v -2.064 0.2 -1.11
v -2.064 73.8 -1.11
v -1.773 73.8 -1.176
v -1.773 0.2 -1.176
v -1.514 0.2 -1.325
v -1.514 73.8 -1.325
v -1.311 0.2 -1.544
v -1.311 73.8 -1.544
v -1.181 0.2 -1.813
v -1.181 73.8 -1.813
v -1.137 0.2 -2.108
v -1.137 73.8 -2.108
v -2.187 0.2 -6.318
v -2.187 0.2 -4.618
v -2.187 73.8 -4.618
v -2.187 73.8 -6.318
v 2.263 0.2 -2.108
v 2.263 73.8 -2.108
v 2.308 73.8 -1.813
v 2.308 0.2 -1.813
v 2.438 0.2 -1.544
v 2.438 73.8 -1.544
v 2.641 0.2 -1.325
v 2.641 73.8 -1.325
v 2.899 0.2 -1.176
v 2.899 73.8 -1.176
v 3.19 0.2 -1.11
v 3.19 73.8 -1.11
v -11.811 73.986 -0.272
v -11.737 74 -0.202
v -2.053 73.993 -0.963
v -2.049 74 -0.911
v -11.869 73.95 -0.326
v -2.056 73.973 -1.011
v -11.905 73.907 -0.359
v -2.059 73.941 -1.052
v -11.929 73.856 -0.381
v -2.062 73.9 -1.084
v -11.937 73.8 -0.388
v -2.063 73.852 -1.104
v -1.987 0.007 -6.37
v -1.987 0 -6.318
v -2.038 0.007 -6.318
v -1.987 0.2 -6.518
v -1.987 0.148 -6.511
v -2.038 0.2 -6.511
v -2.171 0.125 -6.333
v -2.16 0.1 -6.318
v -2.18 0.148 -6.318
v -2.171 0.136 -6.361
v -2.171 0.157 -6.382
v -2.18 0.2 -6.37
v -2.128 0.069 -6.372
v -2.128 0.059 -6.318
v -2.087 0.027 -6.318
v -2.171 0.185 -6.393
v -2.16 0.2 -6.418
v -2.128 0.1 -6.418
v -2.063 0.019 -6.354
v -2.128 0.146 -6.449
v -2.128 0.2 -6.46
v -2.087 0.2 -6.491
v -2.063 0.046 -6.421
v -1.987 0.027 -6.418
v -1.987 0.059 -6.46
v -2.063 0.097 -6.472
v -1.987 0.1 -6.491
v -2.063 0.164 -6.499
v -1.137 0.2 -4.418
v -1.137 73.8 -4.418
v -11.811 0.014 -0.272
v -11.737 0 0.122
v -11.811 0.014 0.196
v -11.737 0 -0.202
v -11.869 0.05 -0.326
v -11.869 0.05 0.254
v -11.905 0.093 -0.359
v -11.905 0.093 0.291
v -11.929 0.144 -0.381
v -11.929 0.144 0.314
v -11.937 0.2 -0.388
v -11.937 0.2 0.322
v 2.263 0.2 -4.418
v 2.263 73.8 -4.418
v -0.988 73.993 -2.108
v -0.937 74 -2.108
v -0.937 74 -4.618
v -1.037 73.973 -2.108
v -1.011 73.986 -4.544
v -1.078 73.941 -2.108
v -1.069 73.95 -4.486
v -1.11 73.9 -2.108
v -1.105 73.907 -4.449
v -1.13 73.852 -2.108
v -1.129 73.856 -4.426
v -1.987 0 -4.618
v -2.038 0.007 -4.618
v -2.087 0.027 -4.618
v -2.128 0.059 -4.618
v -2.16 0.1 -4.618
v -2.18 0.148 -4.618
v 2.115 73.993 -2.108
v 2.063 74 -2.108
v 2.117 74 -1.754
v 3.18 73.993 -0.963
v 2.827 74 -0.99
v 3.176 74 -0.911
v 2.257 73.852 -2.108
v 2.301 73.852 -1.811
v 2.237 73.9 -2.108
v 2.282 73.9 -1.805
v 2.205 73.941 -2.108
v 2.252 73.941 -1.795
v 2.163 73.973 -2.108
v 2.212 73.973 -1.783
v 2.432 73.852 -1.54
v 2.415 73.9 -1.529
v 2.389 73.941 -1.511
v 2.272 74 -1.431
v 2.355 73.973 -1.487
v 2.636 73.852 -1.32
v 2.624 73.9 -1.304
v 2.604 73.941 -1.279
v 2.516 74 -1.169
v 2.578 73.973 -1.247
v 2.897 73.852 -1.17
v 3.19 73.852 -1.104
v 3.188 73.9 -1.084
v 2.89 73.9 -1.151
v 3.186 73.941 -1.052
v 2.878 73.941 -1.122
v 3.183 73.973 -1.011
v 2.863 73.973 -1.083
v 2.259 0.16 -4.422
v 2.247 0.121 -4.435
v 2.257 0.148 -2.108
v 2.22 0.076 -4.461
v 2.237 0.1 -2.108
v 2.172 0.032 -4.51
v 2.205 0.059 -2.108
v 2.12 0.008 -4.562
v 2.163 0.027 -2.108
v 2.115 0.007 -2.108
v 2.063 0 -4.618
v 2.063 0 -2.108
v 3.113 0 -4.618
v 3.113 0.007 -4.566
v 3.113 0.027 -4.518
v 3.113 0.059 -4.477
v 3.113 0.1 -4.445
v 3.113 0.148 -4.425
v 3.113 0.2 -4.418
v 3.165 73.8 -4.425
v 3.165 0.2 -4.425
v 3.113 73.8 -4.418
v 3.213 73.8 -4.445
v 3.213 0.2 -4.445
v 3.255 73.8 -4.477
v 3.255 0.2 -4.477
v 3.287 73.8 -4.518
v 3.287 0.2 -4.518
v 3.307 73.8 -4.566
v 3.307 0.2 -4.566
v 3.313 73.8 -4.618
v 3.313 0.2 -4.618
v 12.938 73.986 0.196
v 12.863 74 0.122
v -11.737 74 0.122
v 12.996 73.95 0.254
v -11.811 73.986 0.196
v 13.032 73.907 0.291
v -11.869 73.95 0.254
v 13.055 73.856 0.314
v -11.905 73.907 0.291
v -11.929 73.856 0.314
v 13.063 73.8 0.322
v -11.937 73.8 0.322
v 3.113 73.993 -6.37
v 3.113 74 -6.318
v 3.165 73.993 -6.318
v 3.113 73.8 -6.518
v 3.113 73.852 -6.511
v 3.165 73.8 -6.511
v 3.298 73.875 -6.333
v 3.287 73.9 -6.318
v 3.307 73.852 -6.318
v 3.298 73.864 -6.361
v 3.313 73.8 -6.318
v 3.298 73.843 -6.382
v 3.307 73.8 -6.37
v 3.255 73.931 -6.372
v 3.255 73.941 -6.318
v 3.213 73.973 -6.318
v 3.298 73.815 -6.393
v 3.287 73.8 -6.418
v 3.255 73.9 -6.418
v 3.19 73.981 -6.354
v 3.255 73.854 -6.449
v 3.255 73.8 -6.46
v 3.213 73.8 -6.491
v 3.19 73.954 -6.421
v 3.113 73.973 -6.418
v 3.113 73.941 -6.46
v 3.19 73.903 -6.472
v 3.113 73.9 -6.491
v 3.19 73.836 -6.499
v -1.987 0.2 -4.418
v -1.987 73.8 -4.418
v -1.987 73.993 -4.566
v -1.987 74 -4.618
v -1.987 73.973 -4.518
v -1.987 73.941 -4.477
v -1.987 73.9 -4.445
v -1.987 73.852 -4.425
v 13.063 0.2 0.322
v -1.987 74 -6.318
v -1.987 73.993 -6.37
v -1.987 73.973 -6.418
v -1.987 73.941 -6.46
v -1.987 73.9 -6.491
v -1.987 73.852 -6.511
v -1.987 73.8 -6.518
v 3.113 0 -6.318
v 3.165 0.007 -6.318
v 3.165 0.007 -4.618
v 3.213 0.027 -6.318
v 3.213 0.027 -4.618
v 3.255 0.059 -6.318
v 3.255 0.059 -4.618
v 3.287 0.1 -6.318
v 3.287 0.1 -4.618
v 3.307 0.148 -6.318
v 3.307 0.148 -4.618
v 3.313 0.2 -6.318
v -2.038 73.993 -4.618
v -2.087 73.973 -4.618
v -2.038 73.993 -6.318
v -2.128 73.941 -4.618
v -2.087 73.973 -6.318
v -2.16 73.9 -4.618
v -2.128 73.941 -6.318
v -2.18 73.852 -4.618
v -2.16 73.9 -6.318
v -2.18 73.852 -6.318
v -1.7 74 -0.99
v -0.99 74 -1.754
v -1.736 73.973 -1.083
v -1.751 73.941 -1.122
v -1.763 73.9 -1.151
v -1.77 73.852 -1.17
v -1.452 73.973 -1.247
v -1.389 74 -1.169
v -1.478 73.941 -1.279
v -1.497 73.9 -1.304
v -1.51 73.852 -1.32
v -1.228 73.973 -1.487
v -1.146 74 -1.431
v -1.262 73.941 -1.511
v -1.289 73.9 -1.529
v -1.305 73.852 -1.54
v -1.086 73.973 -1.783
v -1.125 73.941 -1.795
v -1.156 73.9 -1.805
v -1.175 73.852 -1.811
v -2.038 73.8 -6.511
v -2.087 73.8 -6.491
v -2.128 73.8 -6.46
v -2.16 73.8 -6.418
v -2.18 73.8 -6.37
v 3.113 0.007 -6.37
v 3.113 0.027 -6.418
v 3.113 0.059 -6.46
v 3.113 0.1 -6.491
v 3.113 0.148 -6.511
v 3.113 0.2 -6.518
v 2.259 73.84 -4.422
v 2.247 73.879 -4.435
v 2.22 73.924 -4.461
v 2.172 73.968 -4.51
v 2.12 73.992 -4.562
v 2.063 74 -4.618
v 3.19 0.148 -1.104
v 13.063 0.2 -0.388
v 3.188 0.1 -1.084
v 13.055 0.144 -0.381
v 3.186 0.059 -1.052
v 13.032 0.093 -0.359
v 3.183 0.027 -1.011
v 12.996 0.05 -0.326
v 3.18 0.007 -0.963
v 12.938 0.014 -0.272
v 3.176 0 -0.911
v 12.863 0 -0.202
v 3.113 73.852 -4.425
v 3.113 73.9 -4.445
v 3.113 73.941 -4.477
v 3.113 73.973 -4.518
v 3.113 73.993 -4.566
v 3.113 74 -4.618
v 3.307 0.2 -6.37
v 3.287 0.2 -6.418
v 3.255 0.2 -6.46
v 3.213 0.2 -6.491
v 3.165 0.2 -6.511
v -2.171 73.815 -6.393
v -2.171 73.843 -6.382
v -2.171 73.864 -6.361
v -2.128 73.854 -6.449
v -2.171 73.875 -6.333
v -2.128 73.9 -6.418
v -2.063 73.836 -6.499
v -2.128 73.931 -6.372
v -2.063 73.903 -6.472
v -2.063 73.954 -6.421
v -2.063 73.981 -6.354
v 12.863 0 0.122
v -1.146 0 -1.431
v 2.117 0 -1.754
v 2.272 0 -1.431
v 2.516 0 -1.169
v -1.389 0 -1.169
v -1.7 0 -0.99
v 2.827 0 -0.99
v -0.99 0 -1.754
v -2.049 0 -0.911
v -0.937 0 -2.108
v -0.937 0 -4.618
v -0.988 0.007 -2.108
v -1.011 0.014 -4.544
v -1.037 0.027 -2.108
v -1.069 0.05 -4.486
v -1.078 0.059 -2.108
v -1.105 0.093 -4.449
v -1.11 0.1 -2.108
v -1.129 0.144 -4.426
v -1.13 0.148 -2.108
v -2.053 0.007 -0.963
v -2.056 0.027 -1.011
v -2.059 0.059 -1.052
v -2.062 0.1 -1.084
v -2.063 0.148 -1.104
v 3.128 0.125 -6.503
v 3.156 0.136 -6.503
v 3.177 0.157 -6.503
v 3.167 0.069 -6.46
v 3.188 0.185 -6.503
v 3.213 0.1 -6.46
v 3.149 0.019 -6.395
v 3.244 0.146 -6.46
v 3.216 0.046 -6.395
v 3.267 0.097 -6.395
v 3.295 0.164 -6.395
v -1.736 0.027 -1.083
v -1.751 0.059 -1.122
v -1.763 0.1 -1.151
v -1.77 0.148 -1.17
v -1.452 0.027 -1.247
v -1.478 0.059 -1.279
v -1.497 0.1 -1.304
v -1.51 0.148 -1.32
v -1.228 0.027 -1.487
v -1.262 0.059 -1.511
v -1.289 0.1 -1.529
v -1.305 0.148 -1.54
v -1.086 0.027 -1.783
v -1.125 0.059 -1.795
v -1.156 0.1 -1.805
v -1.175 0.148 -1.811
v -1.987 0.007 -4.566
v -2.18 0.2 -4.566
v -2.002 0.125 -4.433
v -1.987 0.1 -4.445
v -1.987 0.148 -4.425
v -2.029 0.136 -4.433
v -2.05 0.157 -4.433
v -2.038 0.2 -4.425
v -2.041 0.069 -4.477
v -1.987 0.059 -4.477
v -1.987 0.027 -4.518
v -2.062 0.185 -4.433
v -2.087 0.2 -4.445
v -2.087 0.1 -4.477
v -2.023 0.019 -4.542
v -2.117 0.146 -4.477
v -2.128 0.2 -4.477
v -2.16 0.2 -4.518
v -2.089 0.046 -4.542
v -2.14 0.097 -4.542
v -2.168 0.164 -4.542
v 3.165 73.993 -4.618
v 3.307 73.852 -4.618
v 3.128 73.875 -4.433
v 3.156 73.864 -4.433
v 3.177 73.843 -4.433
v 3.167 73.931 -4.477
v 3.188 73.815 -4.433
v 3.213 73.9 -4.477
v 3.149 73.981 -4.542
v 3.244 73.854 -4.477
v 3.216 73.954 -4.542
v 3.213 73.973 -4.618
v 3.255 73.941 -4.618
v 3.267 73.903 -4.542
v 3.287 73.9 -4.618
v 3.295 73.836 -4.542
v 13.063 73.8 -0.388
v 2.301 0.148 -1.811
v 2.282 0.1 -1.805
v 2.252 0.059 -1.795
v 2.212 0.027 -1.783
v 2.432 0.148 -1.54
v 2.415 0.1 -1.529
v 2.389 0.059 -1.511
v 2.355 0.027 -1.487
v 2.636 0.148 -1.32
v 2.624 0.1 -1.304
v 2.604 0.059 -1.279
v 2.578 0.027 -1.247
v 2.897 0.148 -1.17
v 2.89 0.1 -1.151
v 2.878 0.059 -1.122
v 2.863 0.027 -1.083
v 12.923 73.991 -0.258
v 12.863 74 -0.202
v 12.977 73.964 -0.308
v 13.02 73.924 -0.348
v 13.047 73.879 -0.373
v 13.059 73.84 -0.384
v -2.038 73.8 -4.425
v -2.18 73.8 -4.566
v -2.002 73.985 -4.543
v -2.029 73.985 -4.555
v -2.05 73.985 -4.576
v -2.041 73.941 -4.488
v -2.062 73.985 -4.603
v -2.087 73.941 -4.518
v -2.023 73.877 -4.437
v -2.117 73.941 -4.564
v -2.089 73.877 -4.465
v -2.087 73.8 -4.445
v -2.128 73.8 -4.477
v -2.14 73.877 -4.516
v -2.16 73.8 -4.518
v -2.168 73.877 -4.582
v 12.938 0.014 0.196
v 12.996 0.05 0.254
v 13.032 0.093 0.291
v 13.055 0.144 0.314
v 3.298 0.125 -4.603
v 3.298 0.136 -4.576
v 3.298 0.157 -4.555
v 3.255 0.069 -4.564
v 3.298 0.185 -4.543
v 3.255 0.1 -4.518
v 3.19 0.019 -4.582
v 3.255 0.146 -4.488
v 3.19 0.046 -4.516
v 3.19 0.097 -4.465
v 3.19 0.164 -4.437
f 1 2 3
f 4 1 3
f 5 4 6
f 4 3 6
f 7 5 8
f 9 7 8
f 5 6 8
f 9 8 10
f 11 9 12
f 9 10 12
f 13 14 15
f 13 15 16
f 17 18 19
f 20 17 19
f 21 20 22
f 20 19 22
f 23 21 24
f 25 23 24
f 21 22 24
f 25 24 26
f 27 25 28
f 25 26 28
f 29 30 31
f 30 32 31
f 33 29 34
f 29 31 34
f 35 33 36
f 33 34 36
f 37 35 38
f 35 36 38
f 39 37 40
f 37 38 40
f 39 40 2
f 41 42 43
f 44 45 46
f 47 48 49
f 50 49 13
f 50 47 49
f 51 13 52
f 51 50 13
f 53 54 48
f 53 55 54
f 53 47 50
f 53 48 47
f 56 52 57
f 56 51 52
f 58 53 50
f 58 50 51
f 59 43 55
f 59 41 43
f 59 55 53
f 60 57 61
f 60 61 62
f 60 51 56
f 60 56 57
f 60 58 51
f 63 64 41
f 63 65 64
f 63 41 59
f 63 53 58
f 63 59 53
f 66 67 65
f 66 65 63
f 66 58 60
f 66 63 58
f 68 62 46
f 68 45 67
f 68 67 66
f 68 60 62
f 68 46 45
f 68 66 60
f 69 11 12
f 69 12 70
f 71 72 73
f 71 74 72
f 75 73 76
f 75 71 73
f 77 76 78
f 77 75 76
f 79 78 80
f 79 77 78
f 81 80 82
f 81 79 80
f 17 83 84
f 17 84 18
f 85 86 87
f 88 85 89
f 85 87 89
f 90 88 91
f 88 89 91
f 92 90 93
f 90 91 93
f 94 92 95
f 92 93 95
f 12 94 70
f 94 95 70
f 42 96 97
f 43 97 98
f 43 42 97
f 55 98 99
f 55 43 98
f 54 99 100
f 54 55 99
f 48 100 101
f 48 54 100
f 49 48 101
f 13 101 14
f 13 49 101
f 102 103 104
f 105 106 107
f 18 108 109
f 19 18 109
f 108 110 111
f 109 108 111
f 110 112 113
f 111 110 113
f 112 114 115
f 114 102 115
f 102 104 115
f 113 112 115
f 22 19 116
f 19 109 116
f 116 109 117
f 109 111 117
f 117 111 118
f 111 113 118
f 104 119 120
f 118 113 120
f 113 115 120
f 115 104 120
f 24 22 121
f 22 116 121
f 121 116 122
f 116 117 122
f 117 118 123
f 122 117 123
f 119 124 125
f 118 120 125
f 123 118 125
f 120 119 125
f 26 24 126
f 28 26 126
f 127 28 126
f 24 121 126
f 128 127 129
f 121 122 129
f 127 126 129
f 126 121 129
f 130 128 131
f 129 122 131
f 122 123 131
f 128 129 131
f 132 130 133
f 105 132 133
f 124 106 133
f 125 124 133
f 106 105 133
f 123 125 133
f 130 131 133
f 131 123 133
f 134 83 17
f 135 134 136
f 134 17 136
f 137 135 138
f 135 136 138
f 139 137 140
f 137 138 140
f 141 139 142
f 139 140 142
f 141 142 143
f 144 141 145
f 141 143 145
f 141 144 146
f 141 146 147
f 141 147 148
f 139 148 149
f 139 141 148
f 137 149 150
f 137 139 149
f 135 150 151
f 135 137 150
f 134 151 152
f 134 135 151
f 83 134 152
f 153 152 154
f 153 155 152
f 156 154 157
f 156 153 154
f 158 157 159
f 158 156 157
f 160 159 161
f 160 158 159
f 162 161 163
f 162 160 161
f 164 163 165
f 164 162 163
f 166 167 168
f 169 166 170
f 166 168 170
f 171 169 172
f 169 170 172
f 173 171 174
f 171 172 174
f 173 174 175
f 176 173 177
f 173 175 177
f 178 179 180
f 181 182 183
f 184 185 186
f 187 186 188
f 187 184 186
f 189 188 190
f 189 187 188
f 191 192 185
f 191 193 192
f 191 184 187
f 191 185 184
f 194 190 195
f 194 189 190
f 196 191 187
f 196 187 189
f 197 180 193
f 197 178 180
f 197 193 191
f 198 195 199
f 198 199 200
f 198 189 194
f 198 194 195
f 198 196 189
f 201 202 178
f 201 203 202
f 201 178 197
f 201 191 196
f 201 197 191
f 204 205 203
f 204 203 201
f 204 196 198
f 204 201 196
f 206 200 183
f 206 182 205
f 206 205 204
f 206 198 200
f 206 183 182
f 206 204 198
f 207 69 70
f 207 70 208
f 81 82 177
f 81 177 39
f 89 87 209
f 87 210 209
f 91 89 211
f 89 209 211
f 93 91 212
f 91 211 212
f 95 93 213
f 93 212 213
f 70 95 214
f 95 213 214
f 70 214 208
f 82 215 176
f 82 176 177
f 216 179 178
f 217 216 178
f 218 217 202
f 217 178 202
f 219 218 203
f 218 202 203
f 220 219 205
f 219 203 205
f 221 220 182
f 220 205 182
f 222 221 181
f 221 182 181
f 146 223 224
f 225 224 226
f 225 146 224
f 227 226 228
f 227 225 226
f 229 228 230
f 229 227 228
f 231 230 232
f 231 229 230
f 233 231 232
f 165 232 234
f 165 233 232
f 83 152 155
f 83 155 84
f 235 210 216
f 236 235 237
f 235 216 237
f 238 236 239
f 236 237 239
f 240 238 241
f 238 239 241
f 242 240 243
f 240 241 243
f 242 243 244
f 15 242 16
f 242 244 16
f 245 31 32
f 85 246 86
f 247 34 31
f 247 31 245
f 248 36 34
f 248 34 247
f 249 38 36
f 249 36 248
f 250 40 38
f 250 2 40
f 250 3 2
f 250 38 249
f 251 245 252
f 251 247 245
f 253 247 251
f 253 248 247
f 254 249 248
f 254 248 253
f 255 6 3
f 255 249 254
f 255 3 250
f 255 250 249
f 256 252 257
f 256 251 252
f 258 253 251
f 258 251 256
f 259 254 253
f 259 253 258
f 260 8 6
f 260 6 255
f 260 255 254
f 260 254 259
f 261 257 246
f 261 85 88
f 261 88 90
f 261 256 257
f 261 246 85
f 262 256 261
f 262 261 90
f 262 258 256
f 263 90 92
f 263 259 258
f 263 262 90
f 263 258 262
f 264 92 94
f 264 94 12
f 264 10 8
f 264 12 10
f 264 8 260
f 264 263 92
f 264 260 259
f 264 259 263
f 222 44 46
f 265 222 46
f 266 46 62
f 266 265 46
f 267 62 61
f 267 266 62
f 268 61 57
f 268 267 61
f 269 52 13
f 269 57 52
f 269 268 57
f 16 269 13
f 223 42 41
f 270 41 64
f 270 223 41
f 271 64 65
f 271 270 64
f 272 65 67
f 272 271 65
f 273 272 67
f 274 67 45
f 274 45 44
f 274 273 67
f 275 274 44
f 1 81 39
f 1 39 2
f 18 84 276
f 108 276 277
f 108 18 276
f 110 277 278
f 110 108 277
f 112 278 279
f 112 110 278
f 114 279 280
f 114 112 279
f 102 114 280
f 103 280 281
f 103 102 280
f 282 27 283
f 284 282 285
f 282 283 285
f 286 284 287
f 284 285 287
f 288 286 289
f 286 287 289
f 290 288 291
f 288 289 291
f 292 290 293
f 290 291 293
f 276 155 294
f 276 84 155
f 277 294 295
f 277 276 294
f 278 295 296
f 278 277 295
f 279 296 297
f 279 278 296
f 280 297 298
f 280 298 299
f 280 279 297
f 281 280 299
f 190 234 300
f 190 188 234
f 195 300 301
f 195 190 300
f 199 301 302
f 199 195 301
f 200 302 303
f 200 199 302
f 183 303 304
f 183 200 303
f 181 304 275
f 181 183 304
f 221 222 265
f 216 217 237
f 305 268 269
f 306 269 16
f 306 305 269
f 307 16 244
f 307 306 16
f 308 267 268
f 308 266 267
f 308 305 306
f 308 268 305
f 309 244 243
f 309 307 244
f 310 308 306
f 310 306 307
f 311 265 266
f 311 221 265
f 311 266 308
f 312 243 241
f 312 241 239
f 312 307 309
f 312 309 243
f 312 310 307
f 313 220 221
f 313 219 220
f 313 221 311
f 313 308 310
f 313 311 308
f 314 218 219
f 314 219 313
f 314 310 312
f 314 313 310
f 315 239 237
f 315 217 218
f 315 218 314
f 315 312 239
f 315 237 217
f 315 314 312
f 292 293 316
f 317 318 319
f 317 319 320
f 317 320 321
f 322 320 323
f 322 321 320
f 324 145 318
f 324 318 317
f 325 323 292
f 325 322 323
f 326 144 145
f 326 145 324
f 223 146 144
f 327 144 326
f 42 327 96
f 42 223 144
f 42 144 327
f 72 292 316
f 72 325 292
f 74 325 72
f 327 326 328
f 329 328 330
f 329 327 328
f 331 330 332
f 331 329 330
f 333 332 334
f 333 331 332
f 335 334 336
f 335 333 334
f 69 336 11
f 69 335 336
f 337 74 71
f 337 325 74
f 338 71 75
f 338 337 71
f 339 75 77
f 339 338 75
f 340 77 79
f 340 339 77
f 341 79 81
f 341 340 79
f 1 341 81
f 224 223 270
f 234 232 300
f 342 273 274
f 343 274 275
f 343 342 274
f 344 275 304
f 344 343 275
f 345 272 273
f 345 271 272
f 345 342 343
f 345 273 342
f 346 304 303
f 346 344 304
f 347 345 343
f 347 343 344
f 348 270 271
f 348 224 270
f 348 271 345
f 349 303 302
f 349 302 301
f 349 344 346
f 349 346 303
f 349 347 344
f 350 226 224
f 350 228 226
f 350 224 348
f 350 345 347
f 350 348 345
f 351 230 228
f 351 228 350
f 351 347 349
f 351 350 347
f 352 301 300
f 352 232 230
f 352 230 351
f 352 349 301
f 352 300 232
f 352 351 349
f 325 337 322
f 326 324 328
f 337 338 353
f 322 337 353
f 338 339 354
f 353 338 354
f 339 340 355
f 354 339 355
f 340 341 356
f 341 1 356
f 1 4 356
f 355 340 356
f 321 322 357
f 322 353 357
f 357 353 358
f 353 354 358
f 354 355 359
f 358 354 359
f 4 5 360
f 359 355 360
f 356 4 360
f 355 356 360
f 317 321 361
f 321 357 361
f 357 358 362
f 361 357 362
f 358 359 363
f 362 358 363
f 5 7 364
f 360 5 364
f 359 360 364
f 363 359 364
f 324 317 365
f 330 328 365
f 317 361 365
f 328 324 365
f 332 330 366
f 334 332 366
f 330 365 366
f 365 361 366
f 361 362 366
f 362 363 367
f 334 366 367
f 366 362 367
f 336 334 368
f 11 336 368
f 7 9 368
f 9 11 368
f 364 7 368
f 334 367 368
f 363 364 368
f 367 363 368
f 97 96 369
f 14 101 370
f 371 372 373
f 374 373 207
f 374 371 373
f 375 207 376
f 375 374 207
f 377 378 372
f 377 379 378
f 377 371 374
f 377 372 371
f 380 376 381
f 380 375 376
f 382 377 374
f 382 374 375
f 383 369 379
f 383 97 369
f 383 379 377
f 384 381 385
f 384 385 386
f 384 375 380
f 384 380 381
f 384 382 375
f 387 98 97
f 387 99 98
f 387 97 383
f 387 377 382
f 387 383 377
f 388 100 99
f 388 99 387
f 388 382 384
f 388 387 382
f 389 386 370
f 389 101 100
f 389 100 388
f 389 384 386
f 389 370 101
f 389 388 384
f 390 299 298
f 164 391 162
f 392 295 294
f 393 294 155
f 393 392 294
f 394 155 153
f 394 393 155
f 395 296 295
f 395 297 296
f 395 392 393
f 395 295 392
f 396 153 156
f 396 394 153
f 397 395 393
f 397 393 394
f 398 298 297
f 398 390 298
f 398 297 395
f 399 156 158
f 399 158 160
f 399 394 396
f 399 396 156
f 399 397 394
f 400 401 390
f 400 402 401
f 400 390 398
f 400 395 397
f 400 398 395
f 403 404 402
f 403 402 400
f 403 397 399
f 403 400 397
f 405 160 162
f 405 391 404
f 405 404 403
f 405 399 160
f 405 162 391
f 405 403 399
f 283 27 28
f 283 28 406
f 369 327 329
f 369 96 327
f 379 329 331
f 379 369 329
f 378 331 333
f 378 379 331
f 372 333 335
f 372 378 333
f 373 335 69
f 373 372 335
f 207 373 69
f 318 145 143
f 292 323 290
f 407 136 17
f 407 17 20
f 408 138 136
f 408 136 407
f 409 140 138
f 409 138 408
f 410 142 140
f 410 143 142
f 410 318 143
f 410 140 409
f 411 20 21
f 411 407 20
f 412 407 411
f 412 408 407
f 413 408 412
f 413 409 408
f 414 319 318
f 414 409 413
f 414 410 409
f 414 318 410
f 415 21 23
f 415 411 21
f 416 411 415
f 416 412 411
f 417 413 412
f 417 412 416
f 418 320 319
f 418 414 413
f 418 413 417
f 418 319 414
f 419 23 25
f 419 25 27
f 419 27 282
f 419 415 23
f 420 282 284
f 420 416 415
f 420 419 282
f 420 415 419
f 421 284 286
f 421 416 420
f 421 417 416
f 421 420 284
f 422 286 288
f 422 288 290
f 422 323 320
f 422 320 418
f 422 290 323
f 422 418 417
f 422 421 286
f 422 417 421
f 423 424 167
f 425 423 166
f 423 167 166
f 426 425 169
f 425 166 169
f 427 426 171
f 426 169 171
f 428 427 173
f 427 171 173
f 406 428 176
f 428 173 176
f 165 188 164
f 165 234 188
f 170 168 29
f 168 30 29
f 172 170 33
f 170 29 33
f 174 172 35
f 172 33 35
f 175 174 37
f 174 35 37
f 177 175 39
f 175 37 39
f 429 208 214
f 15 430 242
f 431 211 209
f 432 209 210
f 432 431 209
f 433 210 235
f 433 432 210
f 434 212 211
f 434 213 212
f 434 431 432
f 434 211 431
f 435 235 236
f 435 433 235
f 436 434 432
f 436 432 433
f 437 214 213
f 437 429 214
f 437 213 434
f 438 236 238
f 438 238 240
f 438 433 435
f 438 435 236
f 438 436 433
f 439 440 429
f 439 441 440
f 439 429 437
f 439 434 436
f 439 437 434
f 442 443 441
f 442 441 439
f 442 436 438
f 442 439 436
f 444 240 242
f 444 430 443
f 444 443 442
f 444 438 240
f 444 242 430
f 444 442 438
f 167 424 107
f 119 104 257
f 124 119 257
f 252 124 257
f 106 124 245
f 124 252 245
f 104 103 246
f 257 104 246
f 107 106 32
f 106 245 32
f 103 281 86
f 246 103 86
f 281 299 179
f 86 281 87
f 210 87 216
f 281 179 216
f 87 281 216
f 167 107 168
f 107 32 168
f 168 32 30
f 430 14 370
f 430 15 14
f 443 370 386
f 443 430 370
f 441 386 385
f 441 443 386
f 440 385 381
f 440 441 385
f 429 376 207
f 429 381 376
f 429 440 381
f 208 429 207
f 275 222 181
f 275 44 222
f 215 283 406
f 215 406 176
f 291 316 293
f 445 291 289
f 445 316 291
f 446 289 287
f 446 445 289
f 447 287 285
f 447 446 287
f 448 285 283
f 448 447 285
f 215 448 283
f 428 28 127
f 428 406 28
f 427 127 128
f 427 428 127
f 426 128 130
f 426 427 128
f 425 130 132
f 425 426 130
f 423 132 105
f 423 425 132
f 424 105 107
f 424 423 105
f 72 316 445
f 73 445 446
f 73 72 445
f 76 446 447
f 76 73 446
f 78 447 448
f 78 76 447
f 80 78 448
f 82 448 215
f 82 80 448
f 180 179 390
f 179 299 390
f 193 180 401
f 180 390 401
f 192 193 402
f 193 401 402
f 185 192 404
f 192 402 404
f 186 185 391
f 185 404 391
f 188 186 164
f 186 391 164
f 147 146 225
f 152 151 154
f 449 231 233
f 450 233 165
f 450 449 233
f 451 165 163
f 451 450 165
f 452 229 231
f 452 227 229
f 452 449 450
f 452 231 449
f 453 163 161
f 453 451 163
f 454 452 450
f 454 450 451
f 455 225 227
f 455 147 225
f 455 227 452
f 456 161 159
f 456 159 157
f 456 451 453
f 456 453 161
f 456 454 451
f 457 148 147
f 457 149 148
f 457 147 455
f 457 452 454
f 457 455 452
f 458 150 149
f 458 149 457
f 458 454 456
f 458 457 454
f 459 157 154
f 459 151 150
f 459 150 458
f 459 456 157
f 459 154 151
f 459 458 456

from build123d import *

# Parameters (mm, degrees)
BOSS_EXTRUDE1_DEPTH = 74
FILLET2_R           = 1
FILLET3_R           = 0.2


with BuildPart() as part:
    # Sketch4 → Boss-Extrude1 (new body)
    with BuildSketch(Plane(origin=(0, 0, 0), x_dir=(1, 0, 0), z_dir=(0, 1, 0))):
        Polygon((2.263347742, 4.418167116), (2.263347742, 1.178167116), (13.063347742, 0.388167116), (13.063347742, -0.321832884), (-11.936652258, -0.321832884), (-11.936652258, 0.388167116), (-1.136652258, 1.178167116), (-1.136652258, 4.418167116), (-2.186652258, 4.418167116), (-2.186652258, 6.518167116), (3.313347742, 6.518167116), (3.313347742, 4.418167116), align=None)
    extrude(amount=BOSS_EXTRUDE1_DEPTH)

    # Fillet2
    fillet2_edges = [part.edges().sort_by_distance(p)[0] for p in [
        (-1.136652258, 37, -1.178167116),
        (2.263347742, 37, -1.178167116),
    ]]
    fillet(fillet2_edges, radius=FILLET2_R)

    # Fillet3
    fillet3_edges = [part.edges().sort_by_distance(p)[0] for p in [
        (0.563347742, 74, -6.518167116),
        (-1.136652258, 0, -3.26292892),
        (-7.000175641, 0, -0.749261239),
        (-11.936652258, 0, -0.033167116),
        (0.563347742, 0, 0.321832884),
        (13.063347742, 0, -0.033167116),
        (3.313347742, 74, -5.468167116),
        (2.263347742, 0, -3.26292892),
        (2.788347742, 0, -4.418167116),
        (3.313347742, 0, -5.468167116),
        (0.563347742, 0, -6.518167116),
        (-2.186652258, 0, -5.468167116),
        (-1.661652258, 0, -4.418167116),
        (2.788347742, 74, -4.418167116),
        (2.263347742, 74, -3.26292892),
        (3.313347742, 37, -4.418167116),
        (3.313347742, 37, -6.518167116),
        (-2.186652258, 37, -6.518167116),
        (-2.186652258, 37, -4.418167116),
        (13.063347742, 74, -0.033167116),
        (0.563347742, 74, 0.321832884),
        (-11.936652258, 74, -0.033167116),
        (-7.000175641, 74, -0.749261239),
        (8.126871124, 0, -0.749261239),
        (8.126871124, 74, -0.749261239),
        (-1.136652258, 74, -3.26292892),
        (2.5309021, 0, -1.426865209),
        (2.5309021, 74, -1.426865209),
        (-1.404206617, 0, -1.426865209),
        (-1.404206617, 74, -1.426865209),
        (-1.661652258, 74, -4.418167116),
        (-2.186652258, 74, -5.468167116),
    ]]
    fillet(fillet3_edges, radius=FILLET3_R)


solid = part.part
